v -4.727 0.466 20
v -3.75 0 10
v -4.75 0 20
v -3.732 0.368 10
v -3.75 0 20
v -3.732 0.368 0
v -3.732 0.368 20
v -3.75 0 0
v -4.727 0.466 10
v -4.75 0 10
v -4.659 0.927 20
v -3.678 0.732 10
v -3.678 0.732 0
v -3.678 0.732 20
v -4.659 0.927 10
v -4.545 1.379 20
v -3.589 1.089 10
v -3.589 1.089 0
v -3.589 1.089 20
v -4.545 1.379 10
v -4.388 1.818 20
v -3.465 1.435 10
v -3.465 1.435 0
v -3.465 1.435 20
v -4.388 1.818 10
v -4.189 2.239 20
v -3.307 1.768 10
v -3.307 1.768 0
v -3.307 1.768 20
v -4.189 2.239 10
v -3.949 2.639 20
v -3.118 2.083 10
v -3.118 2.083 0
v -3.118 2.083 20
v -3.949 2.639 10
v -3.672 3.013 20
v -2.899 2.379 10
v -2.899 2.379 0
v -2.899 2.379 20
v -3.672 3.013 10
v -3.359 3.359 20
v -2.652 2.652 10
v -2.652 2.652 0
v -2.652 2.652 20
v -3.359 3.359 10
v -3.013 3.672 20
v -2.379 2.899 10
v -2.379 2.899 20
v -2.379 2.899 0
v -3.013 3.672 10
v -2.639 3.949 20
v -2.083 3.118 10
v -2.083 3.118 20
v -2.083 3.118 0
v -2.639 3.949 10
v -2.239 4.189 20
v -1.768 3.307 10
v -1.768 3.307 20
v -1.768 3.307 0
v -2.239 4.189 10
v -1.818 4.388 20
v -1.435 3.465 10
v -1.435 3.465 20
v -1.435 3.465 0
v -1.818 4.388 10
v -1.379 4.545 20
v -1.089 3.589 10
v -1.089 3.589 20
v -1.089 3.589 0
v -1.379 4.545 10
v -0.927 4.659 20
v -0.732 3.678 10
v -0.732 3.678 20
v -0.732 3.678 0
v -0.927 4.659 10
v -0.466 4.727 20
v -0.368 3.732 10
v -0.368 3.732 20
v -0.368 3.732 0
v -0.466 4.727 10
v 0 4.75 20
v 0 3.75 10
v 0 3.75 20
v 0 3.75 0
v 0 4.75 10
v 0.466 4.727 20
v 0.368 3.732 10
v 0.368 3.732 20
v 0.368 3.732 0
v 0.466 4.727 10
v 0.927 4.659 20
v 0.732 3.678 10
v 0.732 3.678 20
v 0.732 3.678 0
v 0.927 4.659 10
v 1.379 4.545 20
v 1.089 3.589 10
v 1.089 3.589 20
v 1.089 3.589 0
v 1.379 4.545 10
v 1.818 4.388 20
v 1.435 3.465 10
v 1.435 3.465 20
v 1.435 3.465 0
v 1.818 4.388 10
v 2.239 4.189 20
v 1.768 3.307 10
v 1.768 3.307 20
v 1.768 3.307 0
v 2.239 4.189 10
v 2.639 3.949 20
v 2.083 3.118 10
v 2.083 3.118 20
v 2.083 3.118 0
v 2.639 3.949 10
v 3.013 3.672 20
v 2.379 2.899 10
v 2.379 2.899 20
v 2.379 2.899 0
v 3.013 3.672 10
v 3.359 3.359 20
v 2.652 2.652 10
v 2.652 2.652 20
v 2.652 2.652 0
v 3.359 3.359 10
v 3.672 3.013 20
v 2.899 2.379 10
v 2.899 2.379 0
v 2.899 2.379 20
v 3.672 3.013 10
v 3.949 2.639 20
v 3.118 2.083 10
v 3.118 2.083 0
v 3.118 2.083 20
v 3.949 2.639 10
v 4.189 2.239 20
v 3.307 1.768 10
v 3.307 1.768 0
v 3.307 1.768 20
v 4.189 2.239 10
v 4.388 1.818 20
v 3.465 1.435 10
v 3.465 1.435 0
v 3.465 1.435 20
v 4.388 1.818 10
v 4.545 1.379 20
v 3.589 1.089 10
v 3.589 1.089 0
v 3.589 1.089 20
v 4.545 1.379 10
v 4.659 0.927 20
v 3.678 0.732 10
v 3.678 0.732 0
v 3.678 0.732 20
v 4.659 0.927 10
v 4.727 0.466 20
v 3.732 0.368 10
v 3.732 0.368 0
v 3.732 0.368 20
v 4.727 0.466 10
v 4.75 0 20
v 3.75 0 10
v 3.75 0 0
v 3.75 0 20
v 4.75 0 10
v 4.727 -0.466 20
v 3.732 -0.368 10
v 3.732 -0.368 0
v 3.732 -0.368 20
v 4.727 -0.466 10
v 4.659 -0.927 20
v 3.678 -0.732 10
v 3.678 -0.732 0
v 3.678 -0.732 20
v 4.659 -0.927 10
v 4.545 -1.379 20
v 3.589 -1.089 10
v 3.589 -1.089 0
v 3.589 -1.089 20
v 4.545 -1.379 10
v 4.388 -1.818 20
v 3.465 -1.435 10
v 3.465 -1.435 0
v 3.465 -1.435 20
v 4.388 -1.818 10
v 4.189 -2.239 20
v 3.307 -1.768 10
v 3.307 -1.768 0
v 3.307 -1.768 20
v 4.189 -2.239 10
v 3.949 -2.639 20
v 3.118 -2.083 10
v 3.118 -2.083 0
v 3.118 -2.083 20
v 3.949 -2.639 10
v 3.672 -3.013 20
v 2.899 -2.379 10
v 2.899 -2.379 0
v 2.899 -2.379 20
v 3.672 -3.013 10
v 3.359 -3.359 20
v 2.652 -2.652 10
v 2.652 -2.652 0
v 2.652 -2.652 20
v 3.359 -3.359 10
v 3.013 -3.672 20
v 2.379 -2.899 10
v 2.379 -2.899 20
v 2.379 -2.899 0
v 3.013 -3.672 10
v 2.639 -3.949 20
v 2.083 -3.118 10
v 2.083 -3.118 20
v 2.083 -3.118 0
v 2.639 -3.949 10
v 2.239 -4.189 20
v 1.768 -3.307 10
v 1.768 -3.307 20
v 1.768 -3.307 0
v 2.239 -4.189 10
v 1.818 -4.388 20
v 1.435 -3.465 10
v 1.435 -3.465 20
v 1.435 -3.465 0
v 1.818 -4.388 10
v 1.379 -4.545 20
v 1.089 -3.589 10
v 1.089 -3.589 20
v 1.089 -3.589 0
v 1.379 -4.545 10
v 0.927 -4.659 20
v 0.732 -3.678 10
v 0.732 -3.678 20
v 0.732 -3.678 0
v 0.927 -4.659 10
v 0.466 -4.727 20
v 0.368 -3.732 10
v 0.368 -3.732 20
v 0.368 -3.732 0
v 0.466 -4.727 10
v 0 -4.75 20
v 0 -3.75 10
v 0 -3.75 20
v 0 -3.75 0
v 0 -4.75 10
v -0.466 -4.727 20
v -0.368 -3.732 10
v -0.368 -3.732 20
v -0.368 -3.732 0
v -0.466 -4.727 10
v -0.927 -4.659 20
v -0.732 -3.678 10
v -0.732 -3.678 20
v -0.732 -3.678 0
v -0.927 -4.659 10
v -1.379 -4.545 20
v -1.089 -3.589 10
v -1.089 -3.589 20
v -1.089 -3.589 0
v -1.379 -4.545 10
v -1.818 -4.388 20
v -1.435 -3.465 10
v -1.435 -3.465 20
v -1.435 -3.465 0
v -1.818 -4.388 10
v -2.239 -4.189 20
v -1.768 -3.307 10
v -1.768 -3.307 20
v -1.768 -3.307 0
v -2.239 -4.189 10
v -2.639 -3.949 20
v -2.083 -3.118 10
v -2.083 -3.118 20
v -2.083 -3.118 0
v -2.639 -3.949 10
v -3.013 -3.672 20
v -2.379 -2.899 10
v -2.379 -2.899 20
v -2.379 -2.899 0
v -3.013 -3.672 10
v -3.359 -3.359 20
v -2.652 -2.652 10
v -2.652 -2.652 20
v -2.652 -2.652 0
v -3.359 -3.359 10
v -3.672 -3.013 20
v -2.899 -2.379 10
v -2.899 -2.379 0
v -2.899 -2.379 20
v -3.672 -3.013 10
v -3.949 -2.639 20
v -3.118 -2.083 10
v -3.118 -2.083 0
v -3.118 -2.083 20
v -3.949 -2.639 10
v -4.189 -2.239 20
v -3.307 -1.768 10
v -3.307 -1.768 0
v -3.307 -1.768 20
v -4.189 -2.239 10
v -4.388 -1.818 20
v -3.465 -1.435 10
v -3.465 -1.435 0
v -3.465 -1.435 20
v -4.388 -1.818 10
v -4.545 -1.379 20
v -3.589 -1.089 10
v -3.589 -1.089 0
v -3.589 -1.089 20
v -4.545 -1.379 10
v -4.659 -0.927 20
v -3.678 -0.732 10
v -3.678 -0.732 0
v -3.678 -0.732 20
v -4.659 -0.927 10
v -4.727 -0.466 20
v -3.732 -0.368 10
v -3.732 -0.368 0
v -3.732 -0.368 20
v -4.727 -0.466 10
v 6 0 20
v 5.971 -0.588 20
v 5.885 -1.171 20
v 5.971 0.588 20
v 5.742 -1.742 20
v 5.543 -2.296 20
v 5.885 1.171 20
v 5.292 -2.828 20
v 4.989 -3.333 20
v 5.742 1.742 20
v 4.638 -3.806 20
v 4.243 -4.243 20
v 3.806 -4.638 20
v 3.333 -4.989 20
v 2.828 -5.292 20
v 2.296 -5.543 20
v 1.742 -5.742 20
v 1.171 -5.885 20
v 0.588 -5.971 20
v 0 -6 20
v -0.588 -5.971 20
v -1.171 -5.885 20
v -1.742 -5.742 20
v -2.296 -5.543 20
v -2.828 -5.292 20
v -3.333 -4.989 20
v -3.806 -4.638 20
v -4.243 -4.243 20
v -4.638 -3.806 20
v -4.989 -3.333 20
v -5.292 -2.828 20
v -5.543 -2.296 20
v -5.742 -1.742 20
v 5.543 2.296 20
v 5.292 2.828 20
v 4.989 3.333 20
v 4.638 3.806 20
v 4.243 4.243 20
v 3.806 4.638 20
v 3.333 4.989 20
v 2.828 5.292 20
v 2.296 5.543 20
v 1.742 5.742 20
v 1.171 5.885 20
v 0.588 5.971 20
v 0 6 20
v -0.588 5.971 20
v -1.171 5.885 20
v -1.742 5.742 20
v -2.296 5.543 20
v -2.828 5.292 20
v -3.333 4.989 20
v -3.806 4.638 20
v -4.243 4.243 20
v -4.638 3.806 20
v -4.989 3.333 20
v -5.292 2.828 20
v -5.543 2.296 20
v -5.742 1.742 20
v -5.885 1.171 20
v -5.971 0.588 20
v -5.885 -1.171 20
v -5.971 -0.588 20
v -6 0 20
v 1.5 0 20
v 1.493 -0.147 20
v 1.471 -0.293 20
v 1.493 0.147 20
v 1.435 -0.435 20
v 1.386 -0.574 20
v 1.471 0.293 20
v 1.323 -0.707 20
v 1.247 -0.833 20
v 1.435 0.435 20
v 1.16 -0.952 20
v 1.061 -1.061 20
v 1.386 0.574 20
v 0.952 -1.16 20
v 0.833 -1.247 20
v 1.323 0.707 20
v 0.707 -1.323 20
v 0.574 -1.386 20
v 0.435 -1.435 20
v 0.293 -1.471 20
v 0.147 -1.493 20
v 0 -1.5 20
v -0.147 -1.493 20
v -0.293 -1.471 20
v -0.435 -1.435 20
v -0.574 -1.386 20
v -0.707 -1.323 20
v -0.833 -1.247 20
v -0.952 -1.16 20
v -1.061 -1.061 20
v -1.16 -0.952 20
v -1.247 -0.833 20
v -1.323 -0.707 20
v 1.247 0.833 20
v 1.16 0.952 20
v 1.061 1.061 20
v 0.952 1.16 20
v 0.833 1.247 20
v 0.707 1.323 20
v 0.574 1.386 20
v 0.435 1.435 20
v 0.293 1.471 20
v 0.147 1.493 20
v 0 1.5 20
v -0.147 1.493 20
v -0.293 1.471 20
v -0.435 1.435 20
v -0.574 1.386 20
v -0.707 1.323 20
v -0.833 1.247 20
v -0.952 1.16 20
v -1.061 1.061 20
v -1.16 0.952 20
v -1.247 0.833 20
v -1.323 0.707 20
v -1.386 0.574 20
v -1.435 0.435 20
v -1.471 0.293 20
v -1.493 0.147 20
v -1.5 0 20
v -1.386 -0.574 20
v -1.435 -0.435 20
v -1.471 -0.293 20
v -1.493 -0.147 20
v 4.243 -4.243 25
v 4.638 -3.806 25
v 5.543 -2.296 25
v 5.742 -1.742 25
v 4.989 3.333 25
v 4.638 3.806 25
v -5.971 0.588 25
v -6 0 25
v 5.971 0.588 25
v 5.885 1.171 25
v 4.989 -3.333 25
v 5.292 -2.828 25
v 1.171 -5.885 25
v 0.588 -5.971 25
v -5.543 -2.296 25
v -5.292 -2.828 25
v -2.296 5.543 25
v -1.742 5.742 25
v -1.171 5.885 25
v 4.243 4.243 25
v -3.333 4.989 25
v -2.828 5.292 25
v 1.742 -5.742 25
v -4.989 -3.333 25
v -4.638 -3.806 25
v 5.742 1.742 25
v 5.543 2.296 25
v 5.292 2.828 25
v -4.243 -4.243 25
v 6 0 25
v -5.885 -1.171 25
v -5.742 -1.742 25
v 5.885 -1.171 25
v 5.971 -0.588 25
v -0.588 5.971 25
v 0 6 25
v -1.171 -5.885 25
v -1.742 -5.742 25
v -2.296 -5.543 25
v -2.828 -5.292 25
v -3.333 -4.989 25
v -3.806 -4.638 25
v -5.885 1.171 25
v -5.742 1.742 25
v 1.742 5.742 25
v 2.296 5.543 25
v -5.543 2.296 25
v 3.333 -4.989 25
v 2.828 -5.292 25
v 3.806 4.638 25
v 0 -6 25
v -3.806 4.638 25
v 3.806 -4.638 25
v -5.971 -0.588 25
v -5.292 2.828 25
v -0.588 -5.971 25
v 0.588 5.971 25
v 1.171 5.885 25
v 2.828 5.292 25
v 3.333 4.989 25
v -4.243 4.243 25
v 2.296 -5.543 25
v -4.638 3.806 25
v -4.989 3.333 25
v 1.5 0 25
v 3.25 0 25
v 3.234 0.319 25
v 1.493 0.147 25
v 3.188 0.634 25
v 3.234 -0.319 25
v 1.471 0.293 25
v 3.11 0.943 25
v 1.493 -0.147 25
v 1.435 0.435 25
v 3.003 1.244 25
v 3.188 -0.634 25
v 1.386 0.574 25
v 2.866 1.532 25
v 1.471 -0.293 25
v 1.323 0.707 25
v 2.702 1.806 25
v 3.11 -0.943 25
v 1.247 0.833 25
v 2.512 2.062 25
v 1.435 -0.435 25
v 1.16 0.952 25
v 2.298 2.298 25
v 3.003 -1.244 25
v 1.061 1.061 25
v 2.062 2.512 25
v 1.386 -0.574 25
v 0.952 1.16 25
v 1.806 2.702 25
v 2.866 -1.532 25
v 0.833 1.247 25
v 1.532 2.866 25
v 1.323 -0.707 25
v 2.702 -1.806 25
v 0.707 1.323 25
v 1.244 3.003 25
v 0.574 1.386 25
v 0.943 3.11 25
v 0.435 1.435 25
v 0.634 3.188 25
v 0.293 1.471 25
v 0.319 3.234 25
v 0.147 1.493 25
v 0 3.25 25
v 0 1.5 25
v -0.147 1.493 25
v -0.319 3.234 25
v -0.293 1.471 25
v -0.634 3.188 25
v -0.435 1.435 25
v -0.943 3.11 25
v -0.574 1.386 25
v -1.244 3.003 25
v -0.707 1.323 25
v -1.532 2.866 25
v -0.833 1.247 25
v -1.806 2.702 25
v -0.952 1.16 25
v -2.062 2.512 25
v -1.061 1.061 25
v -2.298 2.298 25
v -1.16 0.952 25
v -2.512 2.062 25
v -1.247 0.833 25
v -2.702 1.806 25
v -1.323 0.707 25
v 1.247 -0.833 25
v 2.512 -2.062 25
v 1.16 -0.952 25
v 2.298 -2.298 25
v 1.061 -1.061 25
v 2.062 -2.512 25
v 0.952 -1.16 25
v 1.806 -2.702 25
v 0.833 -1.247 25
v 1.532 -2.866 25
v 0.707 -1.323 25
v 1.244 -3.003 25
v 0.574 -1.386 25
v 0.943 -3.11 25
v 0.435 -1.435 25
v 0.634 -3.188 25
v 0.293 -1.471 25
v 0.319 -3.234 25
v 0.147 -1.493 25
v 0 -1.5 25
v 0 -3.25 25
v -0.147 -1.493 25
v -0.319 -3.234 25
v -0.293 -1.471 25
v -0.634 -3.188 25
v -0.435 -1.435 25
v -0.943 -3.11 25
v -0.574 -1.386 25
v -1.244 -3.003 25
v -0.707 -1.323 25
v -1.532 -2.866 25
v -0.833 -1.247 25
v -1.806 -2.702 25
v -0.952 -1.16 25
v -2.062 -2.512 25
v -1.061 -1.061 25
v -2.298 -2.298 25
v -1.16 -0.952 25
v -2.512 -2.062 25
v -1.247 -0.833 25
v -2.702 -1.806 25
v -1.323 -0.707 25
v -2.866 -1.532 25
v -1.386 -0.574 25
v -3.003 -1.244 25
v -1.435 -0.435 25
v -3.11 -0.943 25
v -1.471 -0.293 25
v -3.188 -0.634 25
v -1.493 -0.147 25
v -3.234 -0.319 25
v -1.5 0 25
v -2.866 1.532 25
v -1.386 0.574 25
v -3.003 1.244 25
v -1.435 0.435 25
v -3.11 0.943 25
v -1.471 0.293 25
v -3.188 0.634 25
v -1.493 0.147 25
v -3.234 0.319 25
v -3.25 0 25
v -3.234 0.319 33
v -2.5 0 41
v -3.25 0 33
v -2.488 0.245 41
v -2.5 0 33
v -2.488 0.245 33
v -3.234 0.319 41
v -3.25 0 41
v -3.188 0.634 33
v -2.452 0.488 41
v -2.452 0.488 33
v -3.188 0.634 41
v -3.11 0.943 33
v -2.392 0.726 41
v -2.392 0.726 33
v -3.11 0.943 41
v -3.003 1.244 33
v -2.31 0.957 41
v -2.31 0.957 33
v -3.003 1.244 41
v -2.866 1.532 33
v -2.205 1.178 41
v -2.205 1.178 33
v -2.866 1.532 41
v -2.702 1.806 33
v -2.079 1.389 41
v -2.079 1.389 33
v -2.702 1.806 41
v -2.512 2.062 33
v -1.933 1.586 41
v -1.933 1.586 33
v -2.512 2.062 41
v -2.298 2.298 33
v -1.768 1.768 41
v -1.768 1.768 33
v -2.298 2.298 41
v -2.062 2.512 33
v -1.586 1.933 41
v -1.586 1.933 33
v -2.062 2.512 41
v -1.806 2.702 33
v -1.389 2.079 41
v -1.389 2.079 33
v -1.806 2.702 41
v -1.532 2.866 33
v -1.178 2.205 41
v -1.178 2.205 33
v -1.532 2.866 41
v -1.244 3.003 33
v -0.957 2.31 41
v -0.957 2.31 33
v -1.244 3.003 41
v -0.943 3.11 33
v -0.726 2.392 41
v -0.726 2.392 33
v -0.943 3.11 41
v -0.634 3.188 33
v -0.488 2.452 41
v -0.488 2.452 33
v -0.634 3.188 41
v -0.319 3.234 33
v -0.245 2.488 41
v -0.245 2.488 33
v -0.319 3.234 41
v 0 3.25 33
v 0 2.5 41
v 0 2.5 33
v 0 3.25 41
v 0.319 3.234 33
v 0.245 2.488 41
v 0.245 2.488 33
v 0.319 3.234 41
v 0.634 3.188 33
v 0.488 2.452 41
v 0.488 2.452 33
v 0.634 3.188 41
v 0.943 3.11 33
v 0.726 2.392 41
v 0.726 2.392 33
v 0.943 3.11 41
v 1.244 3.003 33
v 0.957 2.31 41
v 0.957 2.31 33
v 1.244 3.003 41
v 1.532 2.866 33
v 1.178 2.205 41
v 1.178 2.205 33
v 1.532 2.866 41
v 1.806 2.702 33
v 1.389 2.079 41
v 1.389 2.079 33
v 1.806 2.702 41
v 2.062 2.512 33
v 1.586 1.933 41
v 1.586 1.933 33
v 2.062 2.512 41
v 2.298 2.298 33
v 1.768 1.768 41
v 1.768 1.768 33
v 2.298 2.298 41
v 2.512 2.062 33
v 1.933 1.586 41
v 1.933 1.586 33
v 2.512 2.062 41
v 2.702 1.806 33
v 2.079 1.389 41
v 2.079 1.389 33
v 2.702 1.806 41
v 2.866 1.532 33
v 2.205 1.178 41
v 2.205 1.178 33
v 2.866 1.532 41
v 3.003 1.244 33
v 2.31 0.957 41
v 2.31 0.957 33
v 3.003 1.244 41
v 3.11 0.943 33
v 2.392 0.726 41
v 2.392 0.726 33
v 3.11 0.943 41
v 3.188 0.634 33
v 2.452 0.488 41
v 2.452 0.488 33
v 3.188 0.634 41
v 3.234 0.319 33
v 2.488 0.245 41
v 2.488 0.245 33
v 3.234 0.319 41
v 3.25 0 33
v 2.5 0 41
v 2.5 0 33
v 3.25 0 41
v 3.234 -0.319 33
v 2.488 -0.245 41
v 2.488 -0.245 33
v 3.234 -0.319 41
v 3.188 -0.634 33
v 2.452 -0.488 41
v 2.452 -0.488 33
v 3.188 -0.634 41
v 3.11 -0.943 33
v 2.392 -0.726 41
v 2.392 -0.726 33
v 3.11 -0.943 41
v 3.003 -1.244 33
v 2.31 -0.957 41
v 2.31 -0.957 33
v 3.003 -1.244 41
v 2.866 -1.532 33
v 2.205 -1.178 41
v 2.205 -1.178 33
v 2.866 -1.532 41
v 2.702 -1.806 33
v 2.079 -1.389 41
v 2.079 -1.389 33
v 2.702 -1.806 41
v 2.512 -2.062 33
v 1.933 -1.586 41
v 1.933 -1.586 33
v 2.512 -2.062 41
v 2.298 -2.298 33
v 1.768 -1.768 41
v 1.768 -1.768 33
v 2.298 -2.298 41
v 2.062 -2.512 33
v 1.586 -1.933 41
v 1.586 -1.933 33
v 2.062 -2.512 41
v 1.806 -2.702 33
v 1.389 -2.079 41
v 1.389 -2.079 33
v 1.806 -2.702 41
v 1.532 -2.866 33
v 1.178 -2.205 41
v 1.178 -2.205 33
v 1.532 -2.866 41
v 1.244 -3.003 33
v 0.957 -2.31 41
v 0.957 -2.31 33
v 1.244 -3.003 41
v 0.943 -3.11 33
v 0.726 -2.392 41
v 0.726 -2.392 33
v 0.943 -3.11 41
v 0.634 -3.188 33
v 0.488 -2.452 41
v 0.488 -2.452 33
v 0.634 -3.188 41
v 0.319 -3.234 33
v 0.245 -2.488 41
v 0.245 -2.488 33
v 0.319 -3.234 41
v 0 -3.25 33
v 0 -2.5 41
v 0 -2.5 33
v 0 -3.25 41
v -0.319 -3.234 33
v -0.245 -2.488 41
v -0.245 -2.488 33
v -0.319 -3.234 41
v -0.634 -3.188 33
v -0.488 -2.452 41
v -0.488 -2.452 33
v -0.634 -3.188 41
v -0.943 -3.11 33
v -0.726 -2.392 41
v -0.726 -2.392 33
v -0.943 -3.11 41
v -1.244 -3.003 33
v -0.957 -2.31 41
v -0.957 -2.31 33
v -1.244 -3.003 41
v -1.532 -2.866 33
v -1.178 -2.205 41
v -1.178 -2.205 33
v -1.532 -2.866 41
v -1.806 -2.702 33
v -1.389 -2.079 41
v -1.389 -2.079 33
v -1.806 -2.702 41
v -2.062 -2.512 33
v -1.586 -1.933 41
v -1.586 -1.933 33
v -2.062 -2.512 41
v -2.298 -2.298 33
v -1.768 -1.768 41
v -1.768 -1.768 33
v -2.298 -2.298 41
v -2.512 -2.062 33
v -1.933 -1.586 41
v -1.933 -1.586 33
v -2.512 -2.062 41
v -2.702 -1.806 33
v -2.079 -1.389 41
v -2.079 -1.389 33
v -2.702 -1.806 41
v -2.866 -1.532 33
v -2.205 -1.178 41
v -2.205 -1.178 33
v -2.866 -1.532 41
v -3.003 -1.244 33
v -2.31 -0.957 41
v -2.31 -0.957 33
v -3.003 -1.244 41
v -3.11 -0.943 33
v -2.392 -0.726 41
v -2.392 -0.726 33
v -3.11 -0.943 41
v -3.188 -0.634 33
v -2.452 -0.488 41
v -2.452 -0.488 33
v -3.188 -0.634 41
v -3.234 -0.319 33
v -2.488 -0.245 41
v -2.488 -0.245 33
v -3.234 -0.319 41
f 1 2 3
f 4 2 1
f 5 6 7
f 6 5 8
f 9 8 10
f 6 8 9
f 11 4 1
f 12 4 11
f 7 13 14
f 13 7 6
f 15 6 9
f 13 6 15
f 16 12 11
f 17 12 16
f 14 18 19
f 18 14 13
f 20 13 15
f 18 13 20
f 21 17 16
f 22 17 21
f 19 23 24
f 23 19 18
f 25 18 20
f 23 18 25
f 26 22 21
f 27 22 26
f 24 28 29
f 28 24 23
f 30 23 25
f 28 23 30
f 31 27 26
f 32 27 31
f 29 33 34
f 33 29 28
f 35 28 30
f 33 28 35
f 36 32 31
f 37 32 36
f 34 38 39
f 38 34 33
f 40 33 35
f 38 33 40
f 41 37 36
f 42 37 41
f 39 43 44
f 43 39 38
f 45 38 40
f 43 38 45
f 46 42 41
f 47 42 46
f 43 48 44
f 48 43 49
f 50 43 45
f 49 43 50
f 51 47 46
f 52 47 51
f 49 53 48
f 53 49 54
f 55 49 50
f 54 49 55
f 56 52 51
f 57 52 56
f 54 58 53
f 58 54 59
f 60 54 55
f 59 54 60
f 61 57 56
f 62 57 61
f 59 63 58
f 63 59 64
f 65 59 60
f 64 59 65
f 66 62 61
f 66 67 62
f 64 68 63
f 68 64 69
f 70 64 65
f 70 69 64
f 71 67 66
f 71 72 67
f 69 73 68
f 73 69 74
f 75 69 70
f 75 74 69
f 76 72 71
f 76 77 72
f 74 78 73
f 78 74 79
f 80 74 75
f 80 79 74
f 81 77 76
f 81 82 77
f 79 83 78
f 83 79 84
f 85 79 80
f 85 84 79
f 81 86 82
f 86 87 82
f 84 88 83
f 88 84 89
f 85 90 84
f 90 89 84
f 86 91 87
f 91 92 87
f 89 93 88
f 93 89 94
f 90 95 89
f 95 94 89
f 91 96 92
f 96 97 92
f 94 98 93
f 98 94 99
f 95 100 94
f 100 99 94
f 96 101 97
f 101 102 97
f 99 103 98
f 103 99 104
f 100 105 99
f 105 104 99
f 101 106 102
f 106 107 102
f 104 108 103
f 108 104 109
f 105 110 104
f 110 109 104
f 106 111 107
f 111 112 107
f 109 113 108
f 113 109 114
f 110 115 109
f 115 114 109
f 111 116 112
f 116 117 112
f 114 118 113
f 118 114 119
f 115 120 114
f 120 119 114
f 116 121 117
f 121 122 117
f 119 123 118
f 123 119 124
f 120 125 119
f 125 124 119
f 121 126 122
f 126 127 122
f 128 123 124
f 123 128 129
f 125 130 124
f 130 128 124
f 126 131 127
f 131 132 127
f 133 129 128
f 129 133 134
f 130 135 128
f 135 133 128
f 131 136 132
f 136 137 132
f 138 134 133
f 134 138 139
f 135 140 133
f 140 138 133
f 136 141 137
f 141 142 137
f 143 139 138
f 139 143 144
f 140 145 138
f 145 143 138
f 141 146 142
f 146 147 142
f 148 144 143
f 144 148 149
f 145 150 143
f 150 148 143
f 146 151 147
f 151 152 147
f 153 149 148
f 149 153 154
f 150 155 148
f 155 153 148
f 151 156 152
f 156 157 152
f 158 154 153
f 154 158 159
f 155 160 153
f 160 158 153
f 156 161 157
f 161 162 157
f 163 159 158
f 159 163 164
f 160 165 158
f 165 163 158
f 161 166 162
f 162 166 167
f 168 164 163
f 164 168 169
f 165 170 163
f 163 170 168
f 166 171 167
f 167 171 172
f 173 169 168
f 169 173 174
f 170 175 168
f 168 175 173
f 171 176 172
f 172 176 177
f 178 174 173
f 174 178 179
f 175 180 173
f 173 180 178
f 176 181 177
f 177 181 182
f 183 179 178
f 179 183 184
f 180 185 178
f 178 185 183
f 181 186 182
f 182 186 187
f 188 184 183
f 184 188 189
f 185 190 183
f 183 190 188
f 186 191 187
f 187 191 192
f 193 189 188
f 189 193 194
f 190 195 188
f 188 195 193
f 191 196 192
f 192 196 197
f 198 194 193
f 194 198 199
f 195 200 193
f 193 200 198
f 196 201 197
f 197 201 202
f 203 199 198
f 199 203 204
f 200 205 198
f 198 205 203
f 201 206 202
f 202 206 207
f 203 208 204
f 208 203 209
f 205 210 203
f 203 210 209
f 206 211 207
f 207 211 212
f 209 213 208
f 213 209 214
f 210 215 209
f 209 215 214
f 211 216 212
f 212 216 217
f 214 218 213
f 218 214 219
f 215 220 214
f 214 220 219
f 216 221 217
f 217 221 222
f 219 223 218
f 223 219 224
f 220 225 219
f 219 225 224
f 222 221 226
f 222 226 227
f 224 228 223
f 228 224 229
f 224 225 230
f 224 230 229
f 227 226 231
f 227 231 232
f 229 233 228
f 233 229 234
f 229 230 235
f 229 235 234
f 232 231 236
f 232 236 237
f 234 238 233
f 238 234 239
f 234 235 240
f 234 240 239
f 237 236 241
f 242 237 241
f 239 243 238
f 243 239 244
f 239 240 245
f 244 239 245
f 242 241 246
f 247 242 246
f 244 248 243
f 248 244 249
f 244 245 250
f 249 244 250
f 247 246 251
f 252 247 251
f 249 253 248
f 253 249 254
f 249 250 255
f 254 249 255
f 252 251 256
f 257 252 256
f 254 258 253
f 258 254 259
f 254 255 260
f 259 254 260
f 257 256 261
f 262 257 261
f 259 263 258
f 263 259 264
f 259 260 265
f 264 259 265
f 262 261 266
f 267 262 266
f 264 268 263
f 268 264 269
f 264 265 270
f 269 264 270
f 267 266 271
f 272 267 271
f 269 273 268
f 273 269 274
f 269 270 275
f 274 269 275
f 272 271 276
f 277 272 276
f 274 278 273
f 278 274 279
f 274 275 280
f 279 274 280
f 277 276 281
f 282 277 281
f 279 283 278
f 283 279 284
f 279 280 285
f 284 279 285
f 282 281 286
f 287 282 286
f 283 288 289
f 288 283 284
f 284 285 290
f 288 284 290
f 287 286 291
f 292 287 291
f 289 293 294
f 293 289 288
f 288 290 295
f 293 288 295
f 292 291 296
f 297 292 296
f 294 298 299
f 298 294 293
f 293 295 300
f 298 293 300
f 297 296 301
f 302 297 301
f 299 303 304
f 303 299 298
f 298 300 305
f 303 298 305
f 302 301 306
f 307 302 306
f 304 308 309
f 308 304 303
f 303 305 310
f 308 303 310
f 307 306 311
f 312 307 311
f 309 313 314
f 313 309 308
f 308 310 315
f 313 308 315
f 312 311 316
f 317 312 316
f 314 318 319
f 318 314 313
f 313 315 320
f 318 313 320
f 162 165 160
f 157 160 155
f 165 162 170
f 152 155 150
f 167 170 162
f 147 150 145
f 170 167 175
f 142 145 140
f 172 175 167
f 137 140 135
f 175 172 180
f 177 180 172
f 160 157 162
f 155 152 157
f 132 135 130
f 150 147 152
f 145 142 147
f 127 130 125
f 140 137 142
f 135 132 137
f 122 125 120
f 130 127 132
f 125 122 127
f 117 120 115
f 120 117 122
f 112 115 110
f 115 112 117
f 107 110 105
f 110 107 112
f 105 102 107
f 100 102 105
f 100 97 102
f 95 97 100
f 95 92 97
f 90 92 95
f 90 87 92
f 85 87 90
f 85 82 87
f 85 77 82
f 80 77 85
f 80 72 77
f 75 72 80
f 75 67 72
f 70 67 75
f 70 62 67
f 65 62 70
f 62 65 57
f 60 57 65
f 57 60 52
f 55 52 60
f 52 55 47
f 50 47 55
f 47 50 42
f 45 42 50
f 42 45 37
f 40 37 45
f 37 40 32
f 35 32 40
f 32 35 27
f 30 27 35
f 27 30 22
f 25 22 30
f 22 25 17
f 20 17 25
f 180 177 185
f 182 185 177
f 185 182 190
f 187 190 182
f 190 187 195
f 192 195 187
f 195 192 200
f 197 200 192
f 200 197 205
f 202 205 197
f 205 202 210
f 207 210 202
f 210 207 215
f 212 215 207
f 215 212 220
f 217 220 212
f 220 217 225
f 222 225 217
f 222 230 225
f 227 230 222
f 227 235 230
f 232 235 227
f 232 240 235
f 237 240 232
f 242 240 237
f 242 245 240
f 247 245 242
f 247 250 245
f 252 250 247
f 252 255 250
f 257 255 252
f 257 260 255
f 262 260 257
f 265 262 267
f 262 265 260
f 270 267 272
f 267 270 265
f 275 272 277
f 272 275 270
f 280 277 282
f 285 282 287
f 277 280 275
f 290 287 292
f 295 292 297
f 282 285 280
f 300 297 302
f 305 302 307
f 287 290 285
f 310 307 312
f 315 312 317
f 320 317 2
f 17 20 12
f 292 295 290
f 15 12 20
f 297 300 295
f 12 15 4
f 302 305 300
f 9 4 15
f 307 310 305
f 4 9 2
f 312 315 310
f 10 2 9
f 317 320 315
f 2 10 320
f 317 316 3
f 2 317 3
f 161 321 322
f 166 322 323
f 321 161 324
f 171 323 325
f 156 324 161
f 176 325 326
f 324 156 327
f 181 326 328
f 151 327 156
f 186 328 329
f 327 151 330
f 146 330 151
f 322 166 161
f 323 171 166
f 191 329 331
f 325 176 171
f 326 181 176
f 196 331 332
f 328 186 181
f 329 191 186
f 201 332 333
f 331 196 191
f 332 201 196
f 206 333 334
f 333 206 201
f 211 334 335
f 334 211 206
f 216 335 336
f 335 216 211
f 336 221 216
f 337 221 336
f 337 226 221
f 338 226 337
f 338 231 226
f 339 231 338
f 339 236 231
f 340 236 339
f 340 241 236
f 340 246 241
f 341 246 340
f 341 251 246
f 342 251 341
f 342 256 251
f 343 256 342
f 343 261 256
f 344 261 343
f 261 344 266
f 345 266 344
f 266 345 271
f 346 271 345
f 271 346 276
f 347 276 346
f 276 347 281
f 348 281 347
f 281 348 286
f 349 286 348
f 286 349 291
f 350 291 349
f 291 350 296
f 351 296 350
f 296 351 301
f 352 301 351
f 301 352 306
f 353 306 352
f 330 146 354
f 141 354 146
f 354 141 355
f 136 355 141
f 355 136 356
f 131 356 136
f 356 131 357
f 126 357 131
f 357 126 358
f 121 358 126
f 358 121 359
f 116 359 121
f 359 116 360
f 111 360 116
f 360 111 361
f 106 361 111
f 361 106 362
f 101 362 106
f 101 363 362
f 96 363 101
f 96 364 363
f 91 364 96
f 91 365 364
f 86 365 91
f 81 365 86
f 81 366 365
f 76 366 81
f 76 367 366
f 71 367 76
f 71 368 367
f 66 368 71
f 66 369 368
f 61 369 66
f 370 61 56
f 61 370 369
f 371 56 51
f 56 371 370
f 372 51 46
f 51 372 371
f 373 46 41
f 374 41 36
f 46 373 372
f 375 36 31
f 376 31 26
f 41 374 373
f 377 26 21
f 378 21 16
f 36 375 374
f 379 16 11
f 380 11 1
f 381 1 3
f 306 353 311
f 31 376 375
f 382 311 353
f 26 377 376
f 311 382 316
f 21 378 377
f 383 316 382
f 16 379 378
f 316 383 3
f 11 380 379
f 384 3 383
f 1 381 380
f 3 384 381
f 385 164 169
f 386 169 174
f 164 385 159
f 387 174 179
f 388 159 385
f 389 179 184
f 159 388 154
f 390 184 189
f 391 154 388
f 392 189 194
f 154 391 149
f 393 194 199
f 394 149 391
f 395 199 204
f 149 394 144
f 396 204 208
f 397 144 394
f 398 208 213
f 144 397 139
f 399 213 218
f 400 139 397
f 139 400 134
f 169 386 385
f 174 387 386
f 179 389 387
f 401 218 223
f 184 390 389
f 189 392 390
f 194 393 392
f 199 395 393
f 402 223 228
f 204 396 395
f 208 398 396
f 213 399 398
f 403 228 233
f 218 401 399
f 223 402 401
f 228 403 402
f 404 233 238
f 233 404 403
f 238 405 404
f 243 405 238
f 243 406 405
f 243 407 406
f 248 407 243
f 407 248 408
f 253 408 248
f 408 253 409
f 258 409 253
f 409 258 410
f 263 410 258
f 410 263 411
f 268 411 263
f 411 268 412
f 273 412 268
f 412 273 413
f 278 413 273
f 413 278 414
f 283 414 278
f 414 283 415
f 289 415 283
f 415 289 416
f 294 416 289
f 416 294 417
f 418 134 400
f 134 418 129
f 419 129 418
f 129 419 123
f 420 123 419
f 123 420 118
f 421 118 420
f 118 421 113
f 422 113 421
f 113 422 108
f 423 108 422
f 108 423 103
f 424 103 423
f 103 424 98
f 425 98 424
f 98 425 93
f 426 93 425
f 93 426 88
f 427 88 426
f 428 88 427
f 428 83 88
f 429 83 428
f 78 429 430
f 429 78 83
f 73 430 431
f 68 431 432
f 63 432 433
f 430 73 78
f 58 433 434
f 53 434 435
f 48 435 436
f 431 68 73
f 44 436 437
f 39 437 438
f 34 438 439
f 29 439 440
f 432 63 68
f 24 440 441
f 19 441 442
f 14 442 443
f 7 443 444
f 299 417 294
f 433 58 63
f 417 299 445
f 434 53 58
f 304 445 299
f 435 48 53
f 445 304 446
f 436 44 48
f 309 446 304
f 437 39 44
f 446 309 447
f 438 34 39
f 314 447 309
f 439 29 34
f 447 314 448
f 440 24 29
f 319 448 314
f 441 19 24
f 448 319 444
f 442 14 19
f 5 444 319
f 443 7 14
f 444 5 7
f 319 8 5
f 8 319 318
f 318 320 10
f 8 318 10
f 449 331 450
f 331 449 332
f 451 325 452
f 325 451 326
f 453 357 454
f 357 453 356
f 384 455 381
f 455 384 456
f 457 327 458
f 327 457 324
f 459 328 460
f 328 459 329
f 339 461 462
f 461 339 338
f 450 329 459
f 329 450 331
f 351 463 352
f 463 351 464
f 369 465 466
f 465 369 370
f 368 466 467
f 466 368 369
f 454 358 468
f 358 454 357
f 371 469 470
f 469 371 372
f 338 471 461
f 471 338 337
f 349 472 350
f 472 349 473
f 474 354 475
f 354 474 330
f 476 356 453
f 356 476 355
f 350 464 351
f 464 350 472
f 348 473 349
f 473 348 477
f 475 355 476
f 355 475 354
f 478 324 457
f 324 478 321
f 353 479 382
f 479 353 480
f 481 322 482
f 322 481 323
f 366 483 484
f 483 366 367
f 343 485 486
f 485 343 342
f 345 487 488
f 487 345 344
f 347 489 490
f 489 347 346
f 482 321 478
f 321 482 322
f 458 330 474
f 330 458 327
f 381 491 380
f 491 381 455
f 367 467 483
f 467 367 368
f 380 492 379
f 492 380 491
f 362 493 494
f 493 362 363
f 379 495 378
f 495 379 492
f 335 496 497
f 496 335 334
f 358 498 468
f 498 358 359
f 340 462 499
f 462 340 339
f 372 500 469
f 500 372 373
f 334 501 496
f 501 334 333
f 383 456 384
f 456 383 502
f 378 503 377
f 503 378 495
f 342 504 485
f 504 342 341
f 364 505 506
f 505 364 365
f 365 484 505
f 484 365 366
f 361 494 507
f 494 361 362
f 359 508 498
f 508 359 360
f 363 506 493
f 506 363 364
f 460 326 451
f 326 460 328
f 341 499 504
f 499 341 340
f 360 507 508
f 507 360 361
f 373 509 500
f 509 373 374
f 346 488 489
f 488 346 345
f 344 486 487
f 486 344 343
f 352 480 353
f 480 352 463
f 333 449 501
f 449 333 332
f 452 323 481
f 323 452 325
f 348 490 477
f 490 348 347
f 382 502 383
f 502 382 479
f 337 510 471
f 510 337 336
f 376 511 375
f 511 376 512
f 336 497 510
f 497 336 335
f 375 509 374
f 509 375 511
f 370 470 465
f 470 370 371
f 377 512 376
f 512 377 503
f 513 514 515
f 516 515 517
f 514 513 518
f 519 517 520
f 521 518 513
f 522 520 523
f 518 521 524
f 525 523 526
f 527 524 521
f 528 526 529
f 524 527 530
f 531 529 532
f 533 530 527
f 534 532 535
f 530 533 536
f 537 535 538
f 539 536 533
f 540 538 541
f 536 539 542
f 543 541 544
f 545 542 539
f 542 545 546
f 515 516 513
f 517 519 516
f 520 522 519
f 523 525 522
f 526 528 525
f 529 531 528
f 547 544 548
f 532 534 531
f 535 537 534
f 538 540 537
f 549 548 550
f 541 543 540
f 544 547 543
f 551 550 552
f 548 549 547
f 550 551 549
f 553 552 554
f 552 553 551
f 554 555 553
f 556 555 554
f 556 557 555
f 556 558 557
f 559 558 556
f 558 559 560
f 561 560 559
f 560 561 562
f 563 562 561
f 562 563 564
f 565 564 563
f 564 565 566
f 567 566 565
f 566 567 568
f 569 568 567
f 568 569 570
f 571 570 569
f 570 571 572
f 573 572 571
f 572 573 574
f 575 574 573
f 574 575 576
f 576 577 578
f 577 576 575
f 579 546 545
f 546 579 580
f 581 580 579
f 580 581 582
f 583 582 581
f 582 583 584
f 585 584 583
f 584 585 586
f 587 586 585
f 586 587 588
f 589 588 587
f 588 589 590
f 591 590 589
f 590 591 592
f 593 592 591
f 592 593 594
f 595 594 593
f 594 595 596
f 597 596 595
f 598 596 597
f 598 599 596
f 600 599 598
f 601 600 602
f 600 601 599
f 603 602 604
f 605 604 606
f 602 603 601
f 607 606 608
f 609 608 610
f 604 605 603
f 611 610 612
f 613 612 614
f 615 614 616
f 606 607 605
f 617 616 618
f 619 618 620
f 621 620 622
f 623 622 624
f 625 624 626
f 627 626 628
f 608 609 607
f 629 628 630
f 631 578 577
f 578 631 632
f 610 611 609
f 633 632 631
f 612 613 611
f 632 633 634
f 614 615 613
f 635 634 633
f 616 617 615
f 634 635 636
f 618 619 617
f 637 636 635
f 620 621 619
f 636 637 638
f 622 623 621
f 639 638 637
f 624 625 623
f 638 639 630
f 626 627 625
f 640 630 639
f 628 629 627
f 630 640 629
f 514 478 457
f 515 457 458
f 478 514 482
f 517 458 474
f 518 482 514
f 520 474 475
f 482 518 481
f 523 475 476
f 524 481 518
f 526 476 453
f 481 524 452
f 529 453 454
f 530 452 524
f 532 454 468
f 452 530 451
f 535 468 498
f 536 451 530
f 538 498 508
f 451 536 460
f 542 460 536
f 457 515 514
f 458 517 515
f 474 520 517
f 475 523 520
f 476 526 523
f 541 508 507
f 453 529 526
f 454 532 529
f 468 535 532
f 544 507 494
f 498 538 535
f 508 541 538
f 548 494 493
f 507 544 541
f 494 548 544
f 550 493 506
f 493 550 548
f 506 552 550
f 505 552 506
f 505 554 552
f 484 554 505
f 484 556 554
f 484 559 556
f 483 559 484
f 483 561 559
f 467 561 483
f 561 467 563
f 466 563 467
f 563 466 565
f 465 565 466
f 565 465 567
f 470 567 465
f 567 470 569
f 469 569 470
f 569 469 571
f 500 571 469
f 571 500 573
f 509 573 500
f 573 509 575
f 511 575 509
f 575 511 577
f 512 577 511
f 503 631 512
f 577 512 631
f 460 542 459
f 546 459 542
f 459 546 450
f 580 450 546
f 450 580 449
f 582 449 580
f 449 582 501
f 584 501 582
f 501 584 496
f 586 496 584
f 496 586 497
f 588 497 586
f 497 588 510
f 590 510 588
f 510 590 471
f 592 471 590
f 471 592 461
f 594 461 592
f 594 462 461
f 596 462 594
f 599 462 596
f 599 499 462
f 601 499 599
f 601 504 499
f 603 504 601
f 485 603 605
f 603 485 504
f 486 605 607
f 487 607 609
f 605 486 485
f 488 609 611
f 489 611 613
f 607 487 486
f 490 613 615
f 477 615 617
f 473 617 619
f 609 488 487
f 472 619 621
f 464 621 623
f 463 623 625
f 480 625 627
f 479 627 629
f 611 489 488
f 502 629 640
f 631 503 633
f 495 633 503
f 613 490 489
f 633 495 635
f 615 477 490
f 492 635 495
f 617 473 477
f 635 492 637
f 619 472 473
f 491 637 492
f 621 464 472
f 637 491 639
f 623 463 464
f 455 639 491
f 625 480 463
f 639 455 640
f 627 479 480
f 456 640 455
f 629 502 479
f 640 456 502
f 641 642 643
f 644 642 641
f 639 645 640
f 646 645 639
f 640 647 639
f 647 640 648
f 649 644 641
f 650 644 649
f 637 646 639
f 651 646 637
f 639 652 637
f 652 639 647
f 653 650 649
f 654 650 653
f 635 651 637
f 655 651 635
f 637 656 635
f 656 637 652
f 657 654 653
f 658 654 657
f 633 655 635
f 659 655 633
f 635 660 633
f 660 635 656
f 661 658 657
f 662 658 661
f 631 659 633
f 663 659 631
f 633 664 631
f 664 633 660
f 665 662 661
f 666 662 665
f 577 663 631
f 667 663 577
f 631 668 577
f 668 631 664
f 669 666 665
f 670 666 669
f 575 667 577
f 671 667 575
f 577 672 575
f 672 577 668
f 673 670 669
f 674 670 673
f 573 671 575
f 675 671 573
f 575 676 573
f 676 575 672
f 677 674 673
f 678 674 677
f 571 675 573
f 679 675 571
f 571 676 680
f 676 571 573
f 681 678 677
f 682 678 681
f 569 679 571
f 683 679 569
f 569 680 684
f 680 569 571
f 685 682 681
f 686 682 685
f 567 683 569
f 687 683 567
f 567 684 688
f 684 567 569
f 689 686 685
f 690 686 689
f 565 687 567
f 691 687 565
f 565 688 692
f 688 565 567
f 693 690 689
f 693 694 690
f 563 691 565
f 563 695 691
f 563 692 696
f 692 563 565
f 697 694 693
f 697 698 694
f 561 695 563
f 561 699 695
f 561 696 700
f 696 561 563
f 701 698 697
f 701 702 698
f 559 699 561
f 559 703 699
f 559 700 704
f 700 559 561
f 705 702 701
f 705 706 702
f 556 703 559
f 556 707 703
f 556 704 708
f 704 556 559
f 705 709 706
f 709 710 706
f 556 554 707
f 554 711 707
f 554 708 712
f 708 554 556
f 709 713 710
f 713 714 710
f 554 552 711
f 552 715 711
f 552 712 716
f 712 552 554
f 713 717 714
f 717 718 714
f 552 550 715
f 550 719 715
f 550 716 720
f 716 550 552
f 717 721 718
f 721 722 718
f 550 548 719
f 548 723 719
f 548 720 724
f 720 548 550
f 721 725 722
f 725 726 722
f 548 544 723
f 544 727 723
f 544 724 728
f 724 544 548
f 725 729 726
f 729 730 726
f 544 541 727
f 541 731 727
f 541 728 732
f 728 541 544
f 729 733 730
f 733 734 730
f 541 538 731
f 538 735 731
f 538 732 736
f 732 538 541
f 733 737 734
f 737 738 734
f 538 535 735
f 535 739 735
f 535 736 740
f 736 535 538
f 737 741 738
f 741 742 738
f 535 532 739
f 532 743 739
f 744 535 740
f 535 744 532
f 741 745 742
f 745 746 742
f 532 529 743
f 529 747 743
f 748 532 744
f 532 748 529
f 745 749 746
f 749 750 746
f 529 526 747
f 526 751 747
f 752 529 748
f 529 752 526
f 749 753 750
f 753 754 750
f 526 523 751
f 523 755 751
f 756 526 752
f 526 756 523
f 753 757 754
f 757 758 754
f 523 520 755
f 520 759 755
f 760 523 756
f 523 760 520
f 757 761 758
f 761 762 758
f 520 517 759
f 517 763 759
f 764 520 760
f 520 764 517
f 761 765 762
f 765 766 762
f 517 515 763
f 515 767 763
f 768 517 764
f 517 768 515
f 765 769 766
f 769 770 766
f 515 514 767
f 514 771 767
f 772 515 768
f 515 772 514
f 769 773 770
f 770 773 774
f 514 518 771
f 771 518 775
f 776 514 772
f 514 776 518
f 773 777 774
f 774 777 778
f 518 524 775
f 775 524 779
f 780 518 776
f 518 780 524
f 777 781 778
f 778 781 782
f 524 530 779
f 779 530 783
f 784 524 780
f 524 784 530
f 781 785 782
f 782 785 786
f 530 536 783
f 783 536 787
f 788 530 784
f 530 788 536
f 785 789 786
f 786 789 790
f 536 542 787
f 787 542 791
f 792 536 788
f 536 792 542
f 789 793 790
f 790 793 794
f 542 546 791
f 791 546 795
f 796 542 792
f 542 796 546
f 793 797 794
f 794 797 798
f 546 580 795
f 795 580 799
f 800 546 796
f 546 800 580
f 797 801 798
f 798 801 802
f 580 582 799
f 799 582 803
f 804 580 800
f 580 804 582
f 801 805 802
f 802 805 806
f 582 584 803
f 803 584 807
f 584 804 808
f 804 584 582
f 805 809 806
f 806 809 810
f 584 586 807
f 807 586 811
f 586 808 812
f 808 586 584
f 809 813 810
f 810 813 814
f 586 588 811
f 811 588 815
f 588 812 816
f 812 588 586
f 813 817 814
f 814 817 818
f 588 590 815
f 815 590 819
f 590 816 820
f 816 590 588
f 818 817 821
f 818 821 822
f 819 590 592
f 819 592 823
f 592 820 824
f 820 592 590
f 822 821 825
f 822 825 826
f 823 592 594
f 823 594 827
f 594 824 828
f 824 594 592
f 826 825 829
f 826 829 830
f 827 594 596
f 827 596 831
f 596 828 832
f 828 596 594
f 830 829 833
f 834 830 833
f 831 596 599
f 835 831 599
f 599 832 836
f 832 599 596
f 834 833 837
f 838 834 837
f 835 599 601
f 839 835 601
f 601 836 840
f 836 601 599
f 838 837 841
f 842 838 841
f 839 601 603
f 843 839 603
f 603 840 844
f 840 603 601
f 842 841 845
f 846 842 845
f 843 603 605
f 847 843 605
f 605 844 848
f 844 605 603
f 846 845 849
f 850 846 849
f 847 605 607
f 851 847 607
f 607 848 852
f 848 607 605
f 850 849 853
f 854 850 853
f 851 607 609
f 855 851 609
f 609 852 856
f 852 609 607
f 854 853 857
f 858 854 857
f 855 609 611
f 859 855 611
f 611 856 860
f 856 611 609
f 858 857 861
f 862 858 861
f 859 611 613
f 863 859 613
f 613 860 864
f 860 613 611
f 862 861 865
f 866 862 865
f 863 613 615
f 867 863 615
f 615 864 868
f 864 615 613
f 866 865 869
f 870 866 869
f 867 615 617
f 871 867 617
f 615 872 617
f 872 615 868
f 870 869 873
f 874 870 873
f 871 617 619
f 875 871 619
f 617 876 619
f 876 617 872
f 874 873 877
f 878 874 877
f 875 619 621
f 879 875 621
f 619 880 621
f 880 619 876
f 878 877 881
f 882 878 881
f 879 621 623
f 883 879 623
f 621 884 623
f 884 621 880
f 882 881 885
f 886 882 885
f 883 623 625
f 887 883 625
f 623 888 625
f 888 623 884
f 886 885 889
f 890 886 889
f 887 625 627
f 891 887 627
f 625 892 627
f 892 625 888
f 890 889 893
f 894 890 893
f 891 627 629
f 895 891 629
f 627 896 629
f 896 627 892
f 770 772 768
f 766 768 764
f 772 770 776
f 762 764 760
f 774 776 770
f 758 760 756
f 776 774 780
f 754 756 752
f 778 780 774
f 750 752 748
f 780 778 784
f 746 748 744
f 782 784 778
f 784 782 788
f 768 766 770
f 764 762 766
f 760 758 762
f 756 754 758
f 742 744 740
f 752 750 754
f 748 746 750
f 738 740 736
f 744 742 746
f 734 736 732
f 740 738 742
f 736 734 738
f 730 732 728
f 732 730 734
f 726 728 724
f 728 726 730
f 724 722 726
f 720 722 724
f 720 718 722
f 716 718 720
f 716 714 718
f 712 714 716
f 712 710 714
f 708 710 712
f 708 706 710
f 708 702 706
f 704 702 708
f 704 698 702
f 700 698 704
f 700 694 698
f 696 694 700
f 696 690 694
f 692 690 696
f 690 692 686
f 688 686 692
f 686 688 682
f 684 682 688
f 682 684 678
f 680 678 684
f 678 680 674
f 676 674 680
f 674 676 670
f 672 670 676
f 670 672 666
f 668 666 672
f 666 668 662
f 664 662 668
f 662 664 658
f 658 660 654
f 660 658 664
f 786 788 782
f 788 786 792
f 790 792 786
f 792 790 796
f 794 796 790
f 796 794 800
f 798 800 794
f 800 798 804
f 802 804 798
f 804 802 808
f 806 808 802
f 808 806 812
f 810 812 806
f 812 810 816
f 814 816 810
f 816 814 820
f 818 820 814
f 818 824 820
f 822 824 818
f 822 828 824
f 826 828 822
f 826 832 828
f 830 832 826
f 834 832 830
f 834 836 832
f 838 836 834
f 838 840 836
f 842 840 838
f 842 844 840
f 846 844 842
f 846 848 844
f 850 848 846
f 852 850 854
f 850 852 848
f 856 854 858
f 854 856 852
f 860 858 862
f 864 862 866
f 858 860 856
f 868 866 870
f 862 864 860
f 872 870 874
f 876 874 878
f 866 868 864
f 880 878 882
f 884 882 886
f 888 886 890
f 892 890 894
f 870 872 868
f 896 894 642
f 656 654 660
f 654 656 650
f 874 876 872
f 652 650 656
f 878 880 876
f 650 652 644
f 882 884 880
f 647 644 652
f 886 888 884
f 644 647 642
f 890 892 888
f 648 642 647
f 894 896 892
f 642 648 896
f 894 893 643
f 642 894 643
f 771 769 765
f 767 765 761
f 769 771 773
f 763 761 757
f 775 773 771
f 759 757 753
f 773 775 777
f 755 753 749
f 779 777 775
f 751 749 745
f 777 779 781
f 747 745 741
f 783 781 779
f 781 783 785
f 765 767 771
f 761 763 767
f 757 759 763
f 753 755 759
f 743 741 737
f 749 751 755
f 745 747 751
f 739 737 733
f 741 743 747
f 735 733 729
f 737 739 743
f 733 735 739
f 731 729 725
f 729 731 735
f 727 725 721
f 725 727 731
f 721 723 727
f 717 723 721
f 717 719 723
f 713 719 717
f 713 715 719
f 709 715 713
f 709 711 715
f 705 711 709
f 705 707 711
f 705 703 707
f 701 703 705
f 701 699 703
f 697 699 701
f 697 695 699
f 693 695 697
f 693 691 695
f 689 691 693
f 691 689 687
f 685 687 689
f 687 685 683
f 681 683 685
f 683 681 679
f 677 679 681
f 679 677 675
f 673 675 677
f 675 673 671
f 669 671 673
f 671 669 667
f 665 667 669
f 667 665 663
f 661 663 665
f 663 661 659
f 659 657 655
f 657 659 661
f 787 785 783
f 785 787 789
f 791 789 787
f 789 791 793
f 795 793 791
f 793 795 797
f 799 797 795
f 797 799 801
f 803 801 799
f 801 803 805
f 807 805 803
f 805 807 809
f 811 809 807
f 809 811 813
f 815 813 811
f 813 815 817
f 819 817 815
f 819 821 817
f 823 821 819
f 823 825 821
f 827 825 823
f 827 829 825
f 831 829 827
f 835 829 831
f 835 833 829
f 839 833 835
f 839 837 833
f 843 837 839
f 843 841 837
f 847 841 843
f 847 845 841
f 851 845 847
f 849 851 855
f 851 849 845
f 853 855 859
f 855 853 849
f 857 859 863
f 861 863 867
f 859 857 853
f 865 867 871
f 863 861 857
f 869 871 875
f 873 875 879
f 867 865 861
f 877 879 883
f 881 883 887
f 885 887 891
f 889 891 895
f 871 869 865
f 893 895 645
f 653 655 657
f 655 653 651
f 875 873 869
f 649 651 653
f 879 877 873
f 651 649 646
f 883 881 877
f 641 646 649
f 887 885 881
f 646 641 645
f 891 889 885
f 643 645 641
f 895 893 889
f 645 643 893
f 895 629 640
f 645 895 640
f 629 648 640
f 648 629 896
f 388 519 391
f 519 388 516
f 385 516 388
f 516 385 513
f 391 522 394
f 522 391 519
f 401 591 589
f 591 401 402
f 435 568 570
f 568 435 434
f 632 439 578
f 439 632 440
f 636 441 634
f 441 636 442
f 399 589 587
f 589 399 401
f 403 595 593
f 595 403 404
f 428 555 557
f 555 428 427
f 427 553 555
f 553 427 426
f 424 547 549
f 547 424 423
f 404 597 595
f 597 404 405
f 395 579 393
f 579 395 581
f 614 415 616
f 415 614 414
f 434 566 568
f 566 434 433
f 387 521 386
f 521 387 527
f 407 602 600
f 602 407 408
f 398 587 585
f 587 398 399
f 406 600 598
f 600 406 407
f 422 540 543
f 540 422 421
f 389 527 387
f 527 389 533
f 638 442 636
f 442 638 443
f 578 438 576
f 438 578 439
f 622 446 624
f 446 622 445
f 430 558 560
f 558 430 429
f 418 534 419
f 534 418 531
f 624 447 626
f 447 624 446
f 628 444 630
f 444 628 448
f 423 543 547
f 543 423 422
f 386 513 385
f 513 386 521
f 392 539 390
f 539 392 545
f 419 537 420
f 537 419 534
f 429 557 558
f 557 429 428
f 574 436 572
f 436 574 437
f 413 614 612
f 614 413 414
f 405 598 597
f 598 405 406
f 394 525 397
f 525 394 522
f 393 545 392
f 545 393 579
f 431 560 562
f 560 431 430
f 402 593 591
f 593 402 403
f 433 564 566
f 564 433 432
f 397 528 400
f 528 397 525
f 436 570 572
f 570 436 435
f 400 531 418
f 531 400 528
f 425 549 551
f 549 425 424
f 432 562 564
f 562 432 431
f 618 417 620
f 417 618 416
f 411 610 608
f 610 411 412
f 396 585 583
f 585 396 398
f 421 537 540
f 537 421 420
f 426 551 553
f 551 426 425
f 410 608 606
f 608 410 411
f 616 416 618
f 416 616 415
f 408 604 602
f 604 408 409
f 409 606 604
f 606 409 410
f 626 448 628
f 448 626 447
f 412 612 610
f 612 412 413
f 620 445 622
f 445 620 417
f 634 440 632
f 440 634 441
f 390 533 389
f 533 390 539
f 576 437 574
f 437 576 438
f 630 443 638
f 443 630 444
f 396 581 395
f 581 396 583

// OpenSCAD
// Hose Barb Reducer: 8mm ID to 5mm ID
// Designed for FDM printing, standing upright on Z axis.

// Global settings
$fn = 64; // High resolution for round holes

// --- Dimensions for 8mm Tubing Barbs (Bottom Section) ---
// Tubing ID
id_8mm = 8;
// Barb height
h_barb_8 = 10;
// Number of barbs
n_barb_8 = 2;
// Outer diameter at bottom of barb (shoulder)
od_8_bottom = 7.5;
// Outer diameter at top of barb (peak)
od_8_top = 9.5;
// Base height for this section
z_start_8 = 0;

// --- Dimensions for 5mm Tubing Barbs (Top Section) ---
// Tubing ID
id_5mm = 5;
// Barb height
h_barb_5 = 8;
// Number of barbs
n_barb_5 = 2;
// Outer diameter at bottom of barb (shoulder)
od_5_bottom = 6.5;
// Outer diameter at top of barb (peak)
od_5_top = 5.0;
// Base height for this section
z_start_5 = 25;

// --- Collar Dimensions ---
z_collar_start = 20;
z_collar_end = 25;
d_collar = 12;

// --- Bore Dimensions ---
d_bore = 3;
z_bore_start = -1; // Extend slightly past bottom
z_bore_end = 42;   // Extend slightly past top

// --- Helper Module: Create a single sawtooth barb profile ---
// Args:
// z_base: Z coordinate of the bottom of the barb
// h: Height of the barb
// r_bottom: Radius at the bottom (shoulder)
// r_top: Radius at the top (peak)
module barb_profile(z_base, h, r_bottom, r_top) {
    // Create a polygon representing the cross-section of one barb
    // Points: (r_bottom, 0) -> (r_top, h) -> (r_bottom, h) -> (r_bottom, 0)
    // We use linear_extrude or rotate_extrude? No, we are building a 3D object.
    // Since the part is rotationally symmetric, we can use rotate_extrude on a 2D profile.
    // However, the profile is complex. It's easier to build the solid directly using
    // rotate_extrude on a 2D polygon in the XZ plane (y=0).
    
    // Define the 2D polygon for one barb
    polygon(points = [
        [r_bottom, 0],
        [r_top, h],
        [r_bottom, h],
        [r_bottom, 0]
    ]);
}

// --- Main Construction ---
difference() {
    union() {
        // 1. Bottom Section: 8mm Barbs
        // We create a base cylinder for the shoulders and then add the barbs
        // Actually, the barb profile includes the shoulder.
        // Let's build the entire bottom section as a single rotate_extrude profile.
        
        // Profile for bottom section (z=0 to z=20)
        // It consists of two barbs stacked.
        // Barb 1: z=0 to z=10
        // Barb 2: z=10 to z=20
        
        // We can create a single 2D profile that covers z=0 to z=20
        // Points for the profile (radius, z):
        // (od_8_bottom/2, 0) -> (od_8_top/2, h_barb_8) -> (od_8_bottom/2, h_barb_8)
        // -> (od_8_top/2, h_barb_8 + h_barb_8) -> (od_8_bottom/2, h_barb_8 + h_barb_8)
        // -> (od_8_bottom/2, 0)
        
        rotate_extrude(convexity = 10) {
            polygon(points = [
                [od_8_bottom/2, 0],
                [od_8_top/2, h_barb_8],
                [od_8_bottom/2, h_barb_8],
                [od_8_top/2, h_barb_8 * 2],
                [od_8_bottom/2, h_barb_8 * 2],
                [od_8_bottom/2, 0]
            ]);
        }
        
        // 2. Middle Section: Collar
        translate([0, 0, z_collar_start])
        cylinder(h = z_collar_end - z_collar_start, r = d_collar/2, center = false);
        
        // 3. Top Section: 5mm Barbs
        // Profile for top section (z=25 to z=41)
        // It consists of two barbs stacked.
        // Barb 1: z=25 to z=33
        // Barb 2: z=33 to z=41
        
        translate([0, 0, z_start_5])
        rotate_extrude(convexity = 10) {
            polygon(points = [
                [od_5_bottom/2, 0],
                [od_5_top/2, h_barb_5],
                [od_5_bottom/2, h_barb_5],
                [od_5_top/2, h_barb_5 * 2],
                [od_5_bottom/2, h_barb_5 * 2],
                [od_5_bottom/2, 0]
            ]);
        }
    }
    
    // 4. Bore Hole
    // A straight cylinder running through the entire part
    translate([0, 0, z_bore_start])
    cylinder(h = z_bore_end - z_bore_start, r = d_bore/2, center = false);
}
